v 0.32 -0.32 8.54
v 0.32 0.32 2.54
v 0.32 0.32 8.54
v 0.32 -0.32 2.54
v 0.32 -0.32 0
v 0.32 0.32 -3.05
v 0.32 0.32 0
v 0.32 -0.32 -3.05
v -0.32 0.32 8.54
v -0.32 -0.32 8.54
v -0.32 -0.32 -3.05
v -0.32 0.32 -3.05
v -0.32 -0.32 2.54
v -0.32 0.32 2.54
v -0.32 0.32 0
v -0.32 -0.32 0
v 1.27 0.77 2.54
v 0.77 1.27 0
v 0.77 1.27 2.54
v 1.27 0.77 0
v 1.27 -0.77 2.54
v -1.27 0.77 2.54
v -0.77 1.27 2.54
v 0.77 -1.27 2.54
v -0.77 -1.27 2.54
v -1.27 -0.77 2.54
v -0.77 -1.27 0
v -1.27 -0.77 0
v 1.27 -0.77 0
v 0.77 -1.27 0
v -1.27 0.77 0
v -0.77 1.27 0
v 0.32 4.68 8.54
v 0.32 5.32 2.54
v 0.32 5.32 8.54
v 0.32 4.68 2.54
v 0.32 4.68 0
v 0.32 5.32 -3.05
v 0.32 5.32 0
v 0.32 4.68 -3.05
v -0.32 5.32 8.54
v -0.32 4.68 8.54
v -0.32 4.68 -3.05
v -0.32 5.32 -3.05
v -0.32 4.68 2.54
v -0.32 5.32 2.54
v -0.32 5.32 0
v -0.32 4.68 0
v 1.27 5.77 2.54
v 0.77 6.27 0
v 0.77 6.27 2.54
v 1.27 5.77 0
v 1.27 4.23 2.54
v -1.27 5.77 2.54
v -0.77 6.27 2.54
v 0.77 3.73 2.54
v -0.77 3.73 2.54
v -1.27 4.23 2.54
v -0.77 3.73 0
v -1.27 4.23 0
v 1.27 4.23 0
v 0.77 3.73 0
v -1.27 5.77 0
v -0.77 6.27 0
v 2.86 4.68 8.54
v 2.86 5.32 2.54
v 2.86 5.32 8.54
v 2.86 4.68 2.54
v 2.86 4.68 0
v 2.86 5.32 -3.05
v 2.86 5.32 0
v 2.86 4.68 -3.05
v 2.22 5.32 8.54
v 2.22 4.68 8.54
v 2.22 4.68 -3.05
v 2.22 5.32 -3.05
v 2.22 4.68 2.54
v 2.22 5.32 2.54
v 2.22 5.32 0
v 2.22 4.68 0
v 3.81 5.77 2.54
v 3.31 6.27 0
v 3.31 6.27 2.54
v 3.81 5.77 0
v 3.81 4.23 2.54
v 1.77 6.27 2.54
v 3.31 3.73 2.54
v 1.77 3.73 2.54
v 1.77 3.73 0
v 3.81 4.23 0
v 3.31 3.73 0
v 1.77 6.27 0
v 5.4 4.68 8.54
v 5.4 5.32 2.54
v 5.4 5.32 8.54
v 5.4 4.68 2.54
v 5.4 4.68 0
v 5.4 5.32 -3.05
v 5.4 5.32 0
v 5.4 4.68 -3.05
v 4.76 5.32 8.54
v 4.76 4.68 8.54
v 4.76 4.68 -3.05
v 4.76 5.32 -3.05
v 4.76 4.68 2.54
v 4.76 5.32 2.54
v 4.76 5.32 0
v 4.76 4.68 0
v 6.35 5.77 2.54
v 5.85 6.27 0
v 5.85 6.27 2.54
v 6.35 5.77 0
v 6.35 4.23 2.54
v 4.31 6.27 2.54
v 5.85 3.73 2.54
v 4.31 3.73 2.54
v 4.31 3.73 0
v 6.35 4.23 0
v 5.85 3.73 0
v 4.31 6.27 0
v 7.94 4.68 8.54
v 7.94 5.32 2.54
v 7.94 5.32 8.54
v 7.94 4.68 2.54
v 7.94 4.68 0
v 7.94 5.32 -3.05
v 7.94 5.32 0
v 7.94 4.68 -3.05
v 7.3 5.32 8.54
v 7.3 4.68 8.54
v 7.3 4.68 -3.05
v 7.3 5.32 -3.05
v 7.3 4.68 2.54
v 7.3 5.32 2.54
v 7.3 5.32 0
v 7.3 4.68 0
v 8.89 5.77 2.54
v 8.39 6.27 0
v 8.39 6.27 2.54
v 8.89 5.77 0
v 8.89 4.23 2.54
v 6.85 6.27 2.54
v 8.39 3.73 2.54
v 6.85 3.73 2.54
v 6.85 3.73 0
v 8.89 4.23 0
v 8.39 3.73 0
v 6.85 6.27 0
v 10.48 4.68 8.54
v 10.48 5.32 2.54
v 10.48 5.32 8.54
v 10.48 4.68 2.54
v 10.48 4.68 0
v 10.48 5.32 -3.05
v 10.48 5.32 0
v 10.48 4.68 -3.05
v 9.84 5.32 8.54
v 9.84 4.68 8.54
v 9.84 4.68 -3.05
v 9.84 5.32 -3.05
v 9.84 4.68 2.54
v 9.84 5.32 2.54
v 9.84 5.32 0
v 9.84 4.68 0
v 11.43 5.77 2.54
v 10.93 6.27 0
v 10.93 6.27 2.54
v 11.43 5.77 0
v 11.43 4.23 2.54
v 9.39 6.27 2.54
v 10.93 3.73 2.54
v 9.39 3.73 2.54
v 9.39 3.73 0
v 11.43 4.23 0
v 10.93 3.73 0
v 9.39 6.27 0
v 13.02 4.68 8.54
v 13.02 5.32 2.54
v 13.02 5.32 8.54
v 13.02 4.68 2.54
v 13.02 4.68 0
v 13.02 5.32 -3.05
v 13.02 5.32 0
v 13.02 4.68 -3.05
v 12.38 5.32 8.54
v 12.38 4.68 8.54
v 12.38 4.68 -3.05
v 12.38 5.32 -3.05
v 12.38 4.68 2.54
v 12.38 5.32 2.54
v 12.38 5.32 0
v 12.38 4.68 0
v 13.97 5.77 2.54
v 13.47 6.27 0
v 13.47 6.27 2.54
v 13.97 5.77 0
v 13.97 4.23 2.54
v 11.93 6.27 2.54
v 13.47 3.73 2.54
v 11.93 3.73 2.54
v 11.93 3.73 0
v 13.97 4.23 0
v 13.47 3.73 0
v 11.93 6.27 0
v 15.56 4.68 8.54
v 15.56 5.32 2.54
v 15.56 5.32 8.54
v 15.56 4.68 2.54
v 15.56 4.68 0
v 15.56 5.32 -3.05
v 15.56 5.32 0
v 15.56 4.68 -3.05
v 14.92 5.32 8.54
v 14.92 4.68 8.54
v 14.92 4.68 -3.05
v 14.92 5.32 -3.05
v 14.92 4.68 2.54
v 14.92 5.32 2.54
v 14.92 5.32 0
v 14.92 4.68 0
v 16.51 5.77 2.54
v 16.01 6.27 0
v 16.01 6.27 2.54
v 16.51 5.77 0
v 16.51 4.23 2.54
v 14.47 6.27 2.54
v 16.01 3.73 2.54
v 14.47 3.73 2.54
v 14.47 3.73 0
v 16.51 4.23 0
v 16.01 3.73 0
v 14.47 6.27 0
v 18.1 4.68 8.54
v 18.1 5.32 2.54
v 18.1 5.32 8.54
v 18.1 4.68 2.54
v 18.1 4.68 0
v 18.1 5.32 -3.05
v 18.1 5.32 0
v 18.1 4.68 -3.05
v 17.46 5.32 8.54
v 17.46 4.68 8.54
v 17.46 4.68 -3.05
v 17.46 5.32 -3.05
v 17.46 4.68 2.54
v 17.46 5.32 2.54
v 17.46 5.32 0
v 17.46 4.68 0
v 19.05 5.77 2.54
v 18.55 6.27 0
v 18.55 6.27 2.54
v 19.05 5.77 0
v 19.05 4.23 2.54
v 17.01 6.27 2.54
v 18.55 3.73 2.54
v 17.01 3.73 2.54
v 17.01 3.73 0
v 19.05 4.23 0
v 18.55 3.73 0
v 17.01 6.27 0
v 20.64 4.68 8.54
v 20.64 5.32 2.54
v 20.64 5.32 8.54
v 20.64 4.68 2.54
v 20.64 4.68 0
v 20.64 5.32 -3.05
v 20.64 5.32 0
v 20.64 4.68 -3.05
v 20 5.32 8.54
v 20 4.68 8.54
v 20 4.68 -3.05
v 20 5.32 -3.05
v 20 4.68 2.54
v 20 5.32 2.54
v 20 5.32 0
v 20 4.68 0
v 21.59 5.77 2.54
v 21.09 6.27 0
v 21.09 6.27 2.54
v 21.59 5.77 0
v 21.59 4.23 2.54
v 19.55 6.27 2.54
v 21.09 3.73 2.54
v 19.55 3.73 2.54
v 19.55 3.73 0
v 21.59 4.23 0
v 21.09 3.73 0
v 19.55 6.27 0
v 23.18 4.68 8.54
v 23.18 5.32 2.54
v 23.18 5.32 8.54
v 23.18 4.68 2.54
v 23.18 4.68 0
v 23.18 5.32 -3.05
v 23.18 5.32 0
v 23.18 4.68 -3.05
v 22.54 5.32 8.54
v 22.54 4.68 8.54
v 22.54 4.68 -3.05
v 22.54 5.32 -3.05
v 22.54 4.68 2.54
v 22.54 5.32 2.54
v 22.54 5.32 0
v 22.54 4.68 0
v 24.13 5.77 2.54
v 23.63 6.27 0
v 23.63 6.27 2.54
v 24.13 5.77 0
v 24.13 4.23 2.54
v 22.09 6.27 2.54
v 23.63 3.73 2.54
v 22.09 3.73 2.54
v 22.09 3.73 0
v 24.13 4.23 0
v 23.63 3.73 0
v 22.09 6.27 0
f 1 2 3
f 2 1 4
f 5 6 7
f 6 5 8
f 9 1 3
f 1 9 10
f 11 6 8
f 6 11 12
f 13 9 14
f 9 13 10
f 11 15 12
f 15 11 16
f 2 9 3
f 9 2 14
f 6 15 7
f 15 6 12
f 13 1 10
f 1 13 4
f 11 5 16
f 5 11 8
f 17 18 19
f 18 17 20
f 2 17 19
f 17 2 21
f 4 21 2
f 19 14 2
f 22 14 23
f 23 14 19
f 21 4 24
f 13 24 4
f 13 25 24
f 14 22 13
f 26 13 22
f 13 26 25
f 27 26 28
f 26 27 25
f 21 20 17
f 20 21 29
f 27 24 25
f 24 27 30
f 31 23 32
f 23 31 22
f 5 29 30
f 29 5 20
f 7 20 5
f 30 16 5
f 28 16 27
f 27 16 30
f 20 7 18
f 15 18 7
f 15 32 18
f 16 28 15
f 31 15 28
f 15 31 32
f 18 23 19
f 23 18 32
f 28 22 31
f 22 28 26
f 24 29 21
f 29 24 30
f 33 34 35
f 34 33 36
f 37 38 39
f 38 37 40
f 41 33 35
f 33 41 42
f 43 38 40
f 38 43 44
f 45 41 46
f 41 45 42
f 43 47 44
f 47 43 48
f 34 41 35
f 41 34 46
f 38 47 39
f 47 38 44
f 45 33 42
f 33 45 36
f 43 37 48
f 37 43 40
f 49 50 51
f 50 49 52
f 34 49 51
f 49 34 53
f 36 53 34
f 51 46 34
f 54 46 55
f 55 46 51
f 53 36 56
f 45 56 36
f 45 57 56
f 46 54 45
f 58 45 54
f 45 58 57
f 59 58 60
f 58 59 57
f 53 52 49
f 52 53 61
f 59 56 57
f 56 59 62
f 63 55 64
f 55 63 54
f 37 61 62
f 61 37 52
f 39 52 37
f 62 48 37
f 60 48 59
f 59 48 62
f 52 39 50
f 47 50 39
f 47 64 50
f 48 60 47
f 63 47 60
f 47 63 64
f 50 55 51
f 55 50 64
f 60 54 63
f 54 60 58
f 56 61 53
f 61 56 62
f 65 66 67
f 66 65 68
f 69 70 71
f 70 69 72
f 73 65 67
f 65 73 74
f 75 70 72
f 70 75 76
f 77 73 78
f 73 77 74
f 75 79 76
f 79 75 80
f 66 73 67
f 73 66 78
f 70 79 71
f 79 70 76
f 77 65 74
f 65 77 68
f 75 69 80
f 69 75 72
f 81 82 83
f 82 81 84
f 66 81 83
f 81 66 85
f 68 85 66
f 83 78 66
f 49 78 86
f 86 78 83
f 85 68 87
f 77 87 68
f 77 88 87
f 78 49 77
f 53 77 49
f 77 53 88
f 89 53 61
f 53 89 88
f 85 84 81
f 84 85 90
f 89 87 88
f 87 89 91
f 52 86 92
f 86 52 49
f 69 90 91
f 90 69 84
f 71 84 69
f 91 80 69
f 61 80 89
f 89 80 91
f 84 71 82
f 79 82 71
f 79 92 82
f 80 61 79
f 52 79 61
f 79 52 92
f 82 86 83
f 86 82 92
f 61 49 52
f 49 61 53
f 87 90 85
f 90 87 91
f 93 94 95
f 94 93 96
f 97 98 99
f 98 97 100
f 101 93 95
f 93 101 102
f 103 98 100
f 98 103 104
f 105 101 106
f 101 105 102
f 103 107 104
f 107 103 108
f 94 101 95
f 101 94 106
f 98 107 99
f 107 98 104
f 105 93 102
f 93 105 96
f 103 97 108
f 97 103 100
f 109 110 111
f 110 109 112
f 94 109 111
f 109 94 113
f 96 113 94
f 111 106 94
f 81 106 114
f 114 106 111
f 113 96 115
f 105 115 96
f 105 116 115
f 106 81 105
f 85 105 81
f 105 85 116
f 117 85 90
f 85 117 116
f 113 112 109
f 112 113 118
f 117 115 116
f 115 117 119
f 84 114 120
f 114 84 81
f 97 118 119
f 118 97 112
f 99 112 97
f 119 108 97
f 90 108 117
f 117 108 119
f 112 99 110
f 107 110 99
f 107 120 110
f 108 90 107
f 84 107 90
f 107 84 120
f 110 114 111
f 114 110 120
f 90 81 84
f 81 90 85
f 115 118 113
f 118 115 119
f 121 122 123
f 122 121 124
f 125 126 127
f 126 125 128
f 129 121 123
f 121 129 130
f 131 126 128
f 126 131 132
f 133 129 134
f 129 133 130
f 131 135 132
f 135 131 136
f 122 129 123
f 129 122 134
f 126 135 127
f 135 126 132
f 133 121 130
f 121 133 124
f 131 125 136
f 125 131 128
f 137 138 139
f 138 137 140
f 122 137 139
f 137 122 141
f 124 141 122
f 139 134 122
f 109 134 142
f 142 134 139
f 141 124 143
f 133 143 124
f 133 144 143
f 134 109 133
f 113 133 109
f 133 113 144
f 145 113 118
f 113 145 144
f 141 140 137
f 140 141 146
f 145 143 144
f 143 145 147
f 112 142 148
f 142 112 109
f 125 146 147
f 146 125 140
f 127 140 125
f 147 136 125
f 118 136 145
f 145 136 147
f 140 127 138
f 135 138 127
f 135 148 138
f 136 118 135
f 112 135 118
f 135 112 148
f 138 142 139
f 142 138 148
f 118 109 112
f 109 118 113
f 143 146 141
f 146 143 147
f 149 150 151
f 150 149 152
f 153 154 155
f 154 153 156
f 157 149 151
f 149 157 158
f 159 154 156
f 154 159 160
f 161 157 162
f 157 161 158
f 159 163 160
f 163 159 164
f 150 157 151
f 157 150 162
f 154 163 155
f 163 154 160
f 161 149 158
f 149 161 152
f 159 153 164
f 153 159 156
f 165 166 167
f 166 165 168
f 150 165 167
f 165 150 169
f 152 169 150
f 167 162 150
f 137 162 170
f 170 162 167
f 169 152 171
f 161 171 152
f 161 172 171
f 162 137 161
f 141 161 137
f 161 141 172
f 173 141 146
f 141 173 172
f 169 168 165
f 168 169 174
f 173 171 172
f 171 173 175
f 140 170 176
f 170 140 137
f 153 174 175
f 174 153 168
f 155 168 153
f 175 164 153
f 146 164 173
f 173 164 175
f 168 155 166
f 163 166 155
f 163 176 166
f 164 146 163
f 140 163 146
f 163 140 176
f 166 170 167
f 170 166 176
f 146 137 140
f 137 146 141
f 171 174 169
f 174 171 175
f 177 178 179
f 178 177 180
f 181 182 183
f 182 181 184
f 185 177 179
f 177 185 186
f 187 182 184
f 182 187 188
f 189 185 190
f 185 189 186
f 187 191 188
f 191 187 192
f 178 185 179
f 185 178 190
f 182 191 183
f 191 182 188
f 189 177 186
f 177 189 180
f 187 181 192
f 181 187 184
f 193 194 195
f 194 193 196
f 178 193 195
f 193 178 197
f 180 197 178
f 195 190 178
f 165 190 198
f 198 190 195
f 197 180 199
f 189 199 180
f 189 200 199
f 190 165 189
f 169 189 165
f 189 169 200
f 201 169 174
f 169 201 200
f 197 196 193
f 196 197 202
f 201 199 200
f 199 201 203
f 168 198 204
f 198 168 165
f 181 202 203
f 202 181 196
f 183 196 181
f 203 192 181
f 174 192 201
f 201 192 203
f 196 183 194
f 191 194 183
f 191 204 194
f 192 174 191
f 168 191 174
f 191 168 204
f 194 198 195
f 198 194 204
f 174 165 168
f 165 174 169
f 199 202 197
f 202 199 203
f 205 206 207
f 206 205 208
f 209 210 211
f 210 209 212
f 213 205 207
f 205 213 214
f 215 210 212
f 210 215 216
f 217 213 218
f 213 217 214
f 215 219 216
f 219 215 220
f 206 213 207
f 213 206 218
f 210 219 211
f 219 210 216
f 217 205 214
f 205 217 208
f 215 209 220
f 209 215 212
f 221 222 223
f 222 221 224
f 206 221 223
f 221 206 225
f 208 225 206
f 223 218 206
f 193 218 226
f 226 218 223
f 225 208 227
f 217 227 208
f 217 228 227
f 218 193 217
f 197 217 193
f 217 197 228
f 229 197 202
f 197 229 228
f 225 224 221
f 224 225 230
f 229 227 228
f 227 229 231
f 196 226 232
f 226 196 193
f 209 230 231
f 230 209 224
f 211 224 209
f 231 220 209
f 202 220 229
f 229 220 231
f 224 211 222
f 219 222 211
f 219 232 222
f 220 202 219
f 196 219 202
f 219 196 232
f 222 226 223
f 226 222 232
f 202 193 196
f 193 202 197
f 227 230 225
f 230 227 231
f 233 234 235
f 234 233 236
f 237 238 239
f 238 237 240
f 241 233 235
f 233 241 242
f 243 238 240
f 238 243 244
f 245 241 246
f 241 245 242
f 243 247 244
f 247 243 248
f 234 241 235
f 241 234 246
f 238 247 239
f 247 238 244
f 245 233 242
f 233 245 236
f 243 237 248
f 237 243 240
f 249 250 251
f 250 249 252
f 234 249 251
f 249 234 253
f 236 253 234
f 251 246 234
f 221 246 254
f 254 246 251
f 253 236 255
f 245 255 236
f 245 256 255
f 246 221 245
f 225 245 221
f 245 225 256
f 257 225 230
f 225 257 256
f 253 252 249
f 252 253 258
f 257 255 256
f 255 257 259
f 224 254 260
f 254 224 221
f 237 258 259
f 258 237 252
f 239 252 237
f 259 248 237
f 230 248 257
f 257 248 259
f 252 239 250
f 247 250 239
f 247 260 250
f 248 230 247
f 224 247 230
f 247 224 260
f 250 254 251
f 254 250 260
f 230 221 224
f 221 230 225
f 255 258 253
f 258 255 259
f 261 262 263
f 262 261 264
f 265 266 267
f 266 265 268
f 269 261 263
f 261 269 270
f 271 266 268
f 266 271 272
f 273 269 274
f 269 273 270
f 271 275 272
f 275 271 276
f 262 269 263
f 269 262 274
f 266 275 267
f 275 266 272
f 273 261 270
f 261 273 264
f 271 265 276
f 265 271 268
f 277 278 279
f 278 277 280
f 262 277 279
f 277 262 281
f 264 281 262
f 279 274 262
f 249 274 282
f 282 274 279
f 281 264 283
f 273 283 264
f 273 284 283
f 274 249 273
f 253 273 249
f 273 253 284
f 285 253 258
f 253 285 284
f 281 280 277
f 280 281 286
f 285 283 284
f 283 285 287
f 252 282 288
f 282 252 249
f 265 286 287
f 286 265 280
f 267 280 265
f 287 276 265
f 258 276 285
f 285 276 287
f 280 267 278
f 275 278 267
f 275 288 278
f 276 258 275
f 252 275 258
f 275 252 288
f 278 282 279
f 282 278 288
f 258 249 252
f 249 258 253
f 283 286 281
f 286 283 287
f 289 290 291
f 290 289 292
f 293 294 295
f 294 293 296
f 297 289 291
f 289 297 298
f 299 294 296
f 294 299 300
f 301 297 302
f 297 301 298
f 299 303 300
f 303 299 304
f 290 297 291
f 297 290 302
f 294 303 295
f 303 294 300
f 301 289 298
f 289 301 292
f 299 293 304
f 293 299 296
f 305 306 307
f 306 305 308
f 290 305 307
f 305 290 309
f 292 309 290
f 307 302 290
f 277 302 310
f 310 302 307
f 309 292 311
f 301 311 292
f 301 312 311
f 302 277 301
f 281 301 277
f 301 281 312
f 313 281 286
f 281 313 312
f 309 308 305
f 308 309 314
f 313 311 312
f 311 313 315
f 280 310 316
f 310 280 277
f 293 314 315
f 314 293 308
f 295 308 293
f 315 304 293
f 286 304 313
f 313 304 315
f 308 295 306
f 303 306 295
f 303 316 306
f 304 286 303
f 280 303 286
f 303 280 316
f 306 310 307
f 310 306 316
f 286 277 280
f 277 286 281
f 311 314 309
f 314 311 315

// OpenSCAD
// file: config.scad
//// Pin header
// CONFIG

// Colors

pin_color="Silver";	// Pin color
pin_tr=1;		// Pin transparency (0 to 1)
sup_color="Black";	// Support color
sup_tr=1;		// Support transparency (0 to 1)


// Variables

$fn=20;				// Resolution (faces per side on cylinders, cones, ...)
pin_wid=0.64;			// Pin width
pin_b_len=3.05;			// Pin bottom length (side to solder)
sup_wid=2.54;			// Pin support width
sup_len=2.54;			// Pin support length
sup_hei=2.54;			// Pin support height
sup_bev_wid=0.5;		// Pin support bevel width


// Computed variables /!\ DO NOT TOUCH THOSE ONES /!\

pad=0.1;			// Padding value
// main file
//// Pin header
// DESIGN

// Import files

include <./config.scad>

// Pin design

module pin(h_dia=0.9, p_len=6, shape=true) {
	if(shape) {											// Add material
		color(pin_color, pin_tr) {
			translate([-(pin_wid / 2), -(pin_wid / 2), -pin_b_len]) cube([pin_wid, pin_wid, (pin_b_len + sup_hei + p_len)]);
		}

		color(sup_color, sup_tr) {
			translate([-(sup_wid / 2), -(sup_len / 2), 0]) linear_extrude(height = sup_hei) polygon([[sup_bev_wid,0], [(sup_wid - sup_bev_wid),0], [sup_wid,sup_bev_wid], [sup_wid,(sup_len - sup_bev_wid)], [(sup_wid - sup_bev_wid),sup_len], [sup_bev_wid,sup_len], [0,(sup_len - sup_bev_wid)], [0,sup_bev_wid]], convexity = 10);
		}
	}

	else {													// Subtract material
		translate([0, 0, -(pin_b_len + pad)]) cylinder(r=(h_dia / 2), h=(pin_b_len + sup_hei + p_len + (pad * 2)));
	}
}


// Pin row

module pinRow(num, h_dia=0.9, p_len=6, shape=true) {
	for (i = [0 : (num - 1)]) {
		translate([(i * sup_wid), 0, 0]) {
			pin(h_dia, p_len, shape);
		}
	}
}


// DEBUG

pin();
translate([0, 5, 0]) pinRow(10);
